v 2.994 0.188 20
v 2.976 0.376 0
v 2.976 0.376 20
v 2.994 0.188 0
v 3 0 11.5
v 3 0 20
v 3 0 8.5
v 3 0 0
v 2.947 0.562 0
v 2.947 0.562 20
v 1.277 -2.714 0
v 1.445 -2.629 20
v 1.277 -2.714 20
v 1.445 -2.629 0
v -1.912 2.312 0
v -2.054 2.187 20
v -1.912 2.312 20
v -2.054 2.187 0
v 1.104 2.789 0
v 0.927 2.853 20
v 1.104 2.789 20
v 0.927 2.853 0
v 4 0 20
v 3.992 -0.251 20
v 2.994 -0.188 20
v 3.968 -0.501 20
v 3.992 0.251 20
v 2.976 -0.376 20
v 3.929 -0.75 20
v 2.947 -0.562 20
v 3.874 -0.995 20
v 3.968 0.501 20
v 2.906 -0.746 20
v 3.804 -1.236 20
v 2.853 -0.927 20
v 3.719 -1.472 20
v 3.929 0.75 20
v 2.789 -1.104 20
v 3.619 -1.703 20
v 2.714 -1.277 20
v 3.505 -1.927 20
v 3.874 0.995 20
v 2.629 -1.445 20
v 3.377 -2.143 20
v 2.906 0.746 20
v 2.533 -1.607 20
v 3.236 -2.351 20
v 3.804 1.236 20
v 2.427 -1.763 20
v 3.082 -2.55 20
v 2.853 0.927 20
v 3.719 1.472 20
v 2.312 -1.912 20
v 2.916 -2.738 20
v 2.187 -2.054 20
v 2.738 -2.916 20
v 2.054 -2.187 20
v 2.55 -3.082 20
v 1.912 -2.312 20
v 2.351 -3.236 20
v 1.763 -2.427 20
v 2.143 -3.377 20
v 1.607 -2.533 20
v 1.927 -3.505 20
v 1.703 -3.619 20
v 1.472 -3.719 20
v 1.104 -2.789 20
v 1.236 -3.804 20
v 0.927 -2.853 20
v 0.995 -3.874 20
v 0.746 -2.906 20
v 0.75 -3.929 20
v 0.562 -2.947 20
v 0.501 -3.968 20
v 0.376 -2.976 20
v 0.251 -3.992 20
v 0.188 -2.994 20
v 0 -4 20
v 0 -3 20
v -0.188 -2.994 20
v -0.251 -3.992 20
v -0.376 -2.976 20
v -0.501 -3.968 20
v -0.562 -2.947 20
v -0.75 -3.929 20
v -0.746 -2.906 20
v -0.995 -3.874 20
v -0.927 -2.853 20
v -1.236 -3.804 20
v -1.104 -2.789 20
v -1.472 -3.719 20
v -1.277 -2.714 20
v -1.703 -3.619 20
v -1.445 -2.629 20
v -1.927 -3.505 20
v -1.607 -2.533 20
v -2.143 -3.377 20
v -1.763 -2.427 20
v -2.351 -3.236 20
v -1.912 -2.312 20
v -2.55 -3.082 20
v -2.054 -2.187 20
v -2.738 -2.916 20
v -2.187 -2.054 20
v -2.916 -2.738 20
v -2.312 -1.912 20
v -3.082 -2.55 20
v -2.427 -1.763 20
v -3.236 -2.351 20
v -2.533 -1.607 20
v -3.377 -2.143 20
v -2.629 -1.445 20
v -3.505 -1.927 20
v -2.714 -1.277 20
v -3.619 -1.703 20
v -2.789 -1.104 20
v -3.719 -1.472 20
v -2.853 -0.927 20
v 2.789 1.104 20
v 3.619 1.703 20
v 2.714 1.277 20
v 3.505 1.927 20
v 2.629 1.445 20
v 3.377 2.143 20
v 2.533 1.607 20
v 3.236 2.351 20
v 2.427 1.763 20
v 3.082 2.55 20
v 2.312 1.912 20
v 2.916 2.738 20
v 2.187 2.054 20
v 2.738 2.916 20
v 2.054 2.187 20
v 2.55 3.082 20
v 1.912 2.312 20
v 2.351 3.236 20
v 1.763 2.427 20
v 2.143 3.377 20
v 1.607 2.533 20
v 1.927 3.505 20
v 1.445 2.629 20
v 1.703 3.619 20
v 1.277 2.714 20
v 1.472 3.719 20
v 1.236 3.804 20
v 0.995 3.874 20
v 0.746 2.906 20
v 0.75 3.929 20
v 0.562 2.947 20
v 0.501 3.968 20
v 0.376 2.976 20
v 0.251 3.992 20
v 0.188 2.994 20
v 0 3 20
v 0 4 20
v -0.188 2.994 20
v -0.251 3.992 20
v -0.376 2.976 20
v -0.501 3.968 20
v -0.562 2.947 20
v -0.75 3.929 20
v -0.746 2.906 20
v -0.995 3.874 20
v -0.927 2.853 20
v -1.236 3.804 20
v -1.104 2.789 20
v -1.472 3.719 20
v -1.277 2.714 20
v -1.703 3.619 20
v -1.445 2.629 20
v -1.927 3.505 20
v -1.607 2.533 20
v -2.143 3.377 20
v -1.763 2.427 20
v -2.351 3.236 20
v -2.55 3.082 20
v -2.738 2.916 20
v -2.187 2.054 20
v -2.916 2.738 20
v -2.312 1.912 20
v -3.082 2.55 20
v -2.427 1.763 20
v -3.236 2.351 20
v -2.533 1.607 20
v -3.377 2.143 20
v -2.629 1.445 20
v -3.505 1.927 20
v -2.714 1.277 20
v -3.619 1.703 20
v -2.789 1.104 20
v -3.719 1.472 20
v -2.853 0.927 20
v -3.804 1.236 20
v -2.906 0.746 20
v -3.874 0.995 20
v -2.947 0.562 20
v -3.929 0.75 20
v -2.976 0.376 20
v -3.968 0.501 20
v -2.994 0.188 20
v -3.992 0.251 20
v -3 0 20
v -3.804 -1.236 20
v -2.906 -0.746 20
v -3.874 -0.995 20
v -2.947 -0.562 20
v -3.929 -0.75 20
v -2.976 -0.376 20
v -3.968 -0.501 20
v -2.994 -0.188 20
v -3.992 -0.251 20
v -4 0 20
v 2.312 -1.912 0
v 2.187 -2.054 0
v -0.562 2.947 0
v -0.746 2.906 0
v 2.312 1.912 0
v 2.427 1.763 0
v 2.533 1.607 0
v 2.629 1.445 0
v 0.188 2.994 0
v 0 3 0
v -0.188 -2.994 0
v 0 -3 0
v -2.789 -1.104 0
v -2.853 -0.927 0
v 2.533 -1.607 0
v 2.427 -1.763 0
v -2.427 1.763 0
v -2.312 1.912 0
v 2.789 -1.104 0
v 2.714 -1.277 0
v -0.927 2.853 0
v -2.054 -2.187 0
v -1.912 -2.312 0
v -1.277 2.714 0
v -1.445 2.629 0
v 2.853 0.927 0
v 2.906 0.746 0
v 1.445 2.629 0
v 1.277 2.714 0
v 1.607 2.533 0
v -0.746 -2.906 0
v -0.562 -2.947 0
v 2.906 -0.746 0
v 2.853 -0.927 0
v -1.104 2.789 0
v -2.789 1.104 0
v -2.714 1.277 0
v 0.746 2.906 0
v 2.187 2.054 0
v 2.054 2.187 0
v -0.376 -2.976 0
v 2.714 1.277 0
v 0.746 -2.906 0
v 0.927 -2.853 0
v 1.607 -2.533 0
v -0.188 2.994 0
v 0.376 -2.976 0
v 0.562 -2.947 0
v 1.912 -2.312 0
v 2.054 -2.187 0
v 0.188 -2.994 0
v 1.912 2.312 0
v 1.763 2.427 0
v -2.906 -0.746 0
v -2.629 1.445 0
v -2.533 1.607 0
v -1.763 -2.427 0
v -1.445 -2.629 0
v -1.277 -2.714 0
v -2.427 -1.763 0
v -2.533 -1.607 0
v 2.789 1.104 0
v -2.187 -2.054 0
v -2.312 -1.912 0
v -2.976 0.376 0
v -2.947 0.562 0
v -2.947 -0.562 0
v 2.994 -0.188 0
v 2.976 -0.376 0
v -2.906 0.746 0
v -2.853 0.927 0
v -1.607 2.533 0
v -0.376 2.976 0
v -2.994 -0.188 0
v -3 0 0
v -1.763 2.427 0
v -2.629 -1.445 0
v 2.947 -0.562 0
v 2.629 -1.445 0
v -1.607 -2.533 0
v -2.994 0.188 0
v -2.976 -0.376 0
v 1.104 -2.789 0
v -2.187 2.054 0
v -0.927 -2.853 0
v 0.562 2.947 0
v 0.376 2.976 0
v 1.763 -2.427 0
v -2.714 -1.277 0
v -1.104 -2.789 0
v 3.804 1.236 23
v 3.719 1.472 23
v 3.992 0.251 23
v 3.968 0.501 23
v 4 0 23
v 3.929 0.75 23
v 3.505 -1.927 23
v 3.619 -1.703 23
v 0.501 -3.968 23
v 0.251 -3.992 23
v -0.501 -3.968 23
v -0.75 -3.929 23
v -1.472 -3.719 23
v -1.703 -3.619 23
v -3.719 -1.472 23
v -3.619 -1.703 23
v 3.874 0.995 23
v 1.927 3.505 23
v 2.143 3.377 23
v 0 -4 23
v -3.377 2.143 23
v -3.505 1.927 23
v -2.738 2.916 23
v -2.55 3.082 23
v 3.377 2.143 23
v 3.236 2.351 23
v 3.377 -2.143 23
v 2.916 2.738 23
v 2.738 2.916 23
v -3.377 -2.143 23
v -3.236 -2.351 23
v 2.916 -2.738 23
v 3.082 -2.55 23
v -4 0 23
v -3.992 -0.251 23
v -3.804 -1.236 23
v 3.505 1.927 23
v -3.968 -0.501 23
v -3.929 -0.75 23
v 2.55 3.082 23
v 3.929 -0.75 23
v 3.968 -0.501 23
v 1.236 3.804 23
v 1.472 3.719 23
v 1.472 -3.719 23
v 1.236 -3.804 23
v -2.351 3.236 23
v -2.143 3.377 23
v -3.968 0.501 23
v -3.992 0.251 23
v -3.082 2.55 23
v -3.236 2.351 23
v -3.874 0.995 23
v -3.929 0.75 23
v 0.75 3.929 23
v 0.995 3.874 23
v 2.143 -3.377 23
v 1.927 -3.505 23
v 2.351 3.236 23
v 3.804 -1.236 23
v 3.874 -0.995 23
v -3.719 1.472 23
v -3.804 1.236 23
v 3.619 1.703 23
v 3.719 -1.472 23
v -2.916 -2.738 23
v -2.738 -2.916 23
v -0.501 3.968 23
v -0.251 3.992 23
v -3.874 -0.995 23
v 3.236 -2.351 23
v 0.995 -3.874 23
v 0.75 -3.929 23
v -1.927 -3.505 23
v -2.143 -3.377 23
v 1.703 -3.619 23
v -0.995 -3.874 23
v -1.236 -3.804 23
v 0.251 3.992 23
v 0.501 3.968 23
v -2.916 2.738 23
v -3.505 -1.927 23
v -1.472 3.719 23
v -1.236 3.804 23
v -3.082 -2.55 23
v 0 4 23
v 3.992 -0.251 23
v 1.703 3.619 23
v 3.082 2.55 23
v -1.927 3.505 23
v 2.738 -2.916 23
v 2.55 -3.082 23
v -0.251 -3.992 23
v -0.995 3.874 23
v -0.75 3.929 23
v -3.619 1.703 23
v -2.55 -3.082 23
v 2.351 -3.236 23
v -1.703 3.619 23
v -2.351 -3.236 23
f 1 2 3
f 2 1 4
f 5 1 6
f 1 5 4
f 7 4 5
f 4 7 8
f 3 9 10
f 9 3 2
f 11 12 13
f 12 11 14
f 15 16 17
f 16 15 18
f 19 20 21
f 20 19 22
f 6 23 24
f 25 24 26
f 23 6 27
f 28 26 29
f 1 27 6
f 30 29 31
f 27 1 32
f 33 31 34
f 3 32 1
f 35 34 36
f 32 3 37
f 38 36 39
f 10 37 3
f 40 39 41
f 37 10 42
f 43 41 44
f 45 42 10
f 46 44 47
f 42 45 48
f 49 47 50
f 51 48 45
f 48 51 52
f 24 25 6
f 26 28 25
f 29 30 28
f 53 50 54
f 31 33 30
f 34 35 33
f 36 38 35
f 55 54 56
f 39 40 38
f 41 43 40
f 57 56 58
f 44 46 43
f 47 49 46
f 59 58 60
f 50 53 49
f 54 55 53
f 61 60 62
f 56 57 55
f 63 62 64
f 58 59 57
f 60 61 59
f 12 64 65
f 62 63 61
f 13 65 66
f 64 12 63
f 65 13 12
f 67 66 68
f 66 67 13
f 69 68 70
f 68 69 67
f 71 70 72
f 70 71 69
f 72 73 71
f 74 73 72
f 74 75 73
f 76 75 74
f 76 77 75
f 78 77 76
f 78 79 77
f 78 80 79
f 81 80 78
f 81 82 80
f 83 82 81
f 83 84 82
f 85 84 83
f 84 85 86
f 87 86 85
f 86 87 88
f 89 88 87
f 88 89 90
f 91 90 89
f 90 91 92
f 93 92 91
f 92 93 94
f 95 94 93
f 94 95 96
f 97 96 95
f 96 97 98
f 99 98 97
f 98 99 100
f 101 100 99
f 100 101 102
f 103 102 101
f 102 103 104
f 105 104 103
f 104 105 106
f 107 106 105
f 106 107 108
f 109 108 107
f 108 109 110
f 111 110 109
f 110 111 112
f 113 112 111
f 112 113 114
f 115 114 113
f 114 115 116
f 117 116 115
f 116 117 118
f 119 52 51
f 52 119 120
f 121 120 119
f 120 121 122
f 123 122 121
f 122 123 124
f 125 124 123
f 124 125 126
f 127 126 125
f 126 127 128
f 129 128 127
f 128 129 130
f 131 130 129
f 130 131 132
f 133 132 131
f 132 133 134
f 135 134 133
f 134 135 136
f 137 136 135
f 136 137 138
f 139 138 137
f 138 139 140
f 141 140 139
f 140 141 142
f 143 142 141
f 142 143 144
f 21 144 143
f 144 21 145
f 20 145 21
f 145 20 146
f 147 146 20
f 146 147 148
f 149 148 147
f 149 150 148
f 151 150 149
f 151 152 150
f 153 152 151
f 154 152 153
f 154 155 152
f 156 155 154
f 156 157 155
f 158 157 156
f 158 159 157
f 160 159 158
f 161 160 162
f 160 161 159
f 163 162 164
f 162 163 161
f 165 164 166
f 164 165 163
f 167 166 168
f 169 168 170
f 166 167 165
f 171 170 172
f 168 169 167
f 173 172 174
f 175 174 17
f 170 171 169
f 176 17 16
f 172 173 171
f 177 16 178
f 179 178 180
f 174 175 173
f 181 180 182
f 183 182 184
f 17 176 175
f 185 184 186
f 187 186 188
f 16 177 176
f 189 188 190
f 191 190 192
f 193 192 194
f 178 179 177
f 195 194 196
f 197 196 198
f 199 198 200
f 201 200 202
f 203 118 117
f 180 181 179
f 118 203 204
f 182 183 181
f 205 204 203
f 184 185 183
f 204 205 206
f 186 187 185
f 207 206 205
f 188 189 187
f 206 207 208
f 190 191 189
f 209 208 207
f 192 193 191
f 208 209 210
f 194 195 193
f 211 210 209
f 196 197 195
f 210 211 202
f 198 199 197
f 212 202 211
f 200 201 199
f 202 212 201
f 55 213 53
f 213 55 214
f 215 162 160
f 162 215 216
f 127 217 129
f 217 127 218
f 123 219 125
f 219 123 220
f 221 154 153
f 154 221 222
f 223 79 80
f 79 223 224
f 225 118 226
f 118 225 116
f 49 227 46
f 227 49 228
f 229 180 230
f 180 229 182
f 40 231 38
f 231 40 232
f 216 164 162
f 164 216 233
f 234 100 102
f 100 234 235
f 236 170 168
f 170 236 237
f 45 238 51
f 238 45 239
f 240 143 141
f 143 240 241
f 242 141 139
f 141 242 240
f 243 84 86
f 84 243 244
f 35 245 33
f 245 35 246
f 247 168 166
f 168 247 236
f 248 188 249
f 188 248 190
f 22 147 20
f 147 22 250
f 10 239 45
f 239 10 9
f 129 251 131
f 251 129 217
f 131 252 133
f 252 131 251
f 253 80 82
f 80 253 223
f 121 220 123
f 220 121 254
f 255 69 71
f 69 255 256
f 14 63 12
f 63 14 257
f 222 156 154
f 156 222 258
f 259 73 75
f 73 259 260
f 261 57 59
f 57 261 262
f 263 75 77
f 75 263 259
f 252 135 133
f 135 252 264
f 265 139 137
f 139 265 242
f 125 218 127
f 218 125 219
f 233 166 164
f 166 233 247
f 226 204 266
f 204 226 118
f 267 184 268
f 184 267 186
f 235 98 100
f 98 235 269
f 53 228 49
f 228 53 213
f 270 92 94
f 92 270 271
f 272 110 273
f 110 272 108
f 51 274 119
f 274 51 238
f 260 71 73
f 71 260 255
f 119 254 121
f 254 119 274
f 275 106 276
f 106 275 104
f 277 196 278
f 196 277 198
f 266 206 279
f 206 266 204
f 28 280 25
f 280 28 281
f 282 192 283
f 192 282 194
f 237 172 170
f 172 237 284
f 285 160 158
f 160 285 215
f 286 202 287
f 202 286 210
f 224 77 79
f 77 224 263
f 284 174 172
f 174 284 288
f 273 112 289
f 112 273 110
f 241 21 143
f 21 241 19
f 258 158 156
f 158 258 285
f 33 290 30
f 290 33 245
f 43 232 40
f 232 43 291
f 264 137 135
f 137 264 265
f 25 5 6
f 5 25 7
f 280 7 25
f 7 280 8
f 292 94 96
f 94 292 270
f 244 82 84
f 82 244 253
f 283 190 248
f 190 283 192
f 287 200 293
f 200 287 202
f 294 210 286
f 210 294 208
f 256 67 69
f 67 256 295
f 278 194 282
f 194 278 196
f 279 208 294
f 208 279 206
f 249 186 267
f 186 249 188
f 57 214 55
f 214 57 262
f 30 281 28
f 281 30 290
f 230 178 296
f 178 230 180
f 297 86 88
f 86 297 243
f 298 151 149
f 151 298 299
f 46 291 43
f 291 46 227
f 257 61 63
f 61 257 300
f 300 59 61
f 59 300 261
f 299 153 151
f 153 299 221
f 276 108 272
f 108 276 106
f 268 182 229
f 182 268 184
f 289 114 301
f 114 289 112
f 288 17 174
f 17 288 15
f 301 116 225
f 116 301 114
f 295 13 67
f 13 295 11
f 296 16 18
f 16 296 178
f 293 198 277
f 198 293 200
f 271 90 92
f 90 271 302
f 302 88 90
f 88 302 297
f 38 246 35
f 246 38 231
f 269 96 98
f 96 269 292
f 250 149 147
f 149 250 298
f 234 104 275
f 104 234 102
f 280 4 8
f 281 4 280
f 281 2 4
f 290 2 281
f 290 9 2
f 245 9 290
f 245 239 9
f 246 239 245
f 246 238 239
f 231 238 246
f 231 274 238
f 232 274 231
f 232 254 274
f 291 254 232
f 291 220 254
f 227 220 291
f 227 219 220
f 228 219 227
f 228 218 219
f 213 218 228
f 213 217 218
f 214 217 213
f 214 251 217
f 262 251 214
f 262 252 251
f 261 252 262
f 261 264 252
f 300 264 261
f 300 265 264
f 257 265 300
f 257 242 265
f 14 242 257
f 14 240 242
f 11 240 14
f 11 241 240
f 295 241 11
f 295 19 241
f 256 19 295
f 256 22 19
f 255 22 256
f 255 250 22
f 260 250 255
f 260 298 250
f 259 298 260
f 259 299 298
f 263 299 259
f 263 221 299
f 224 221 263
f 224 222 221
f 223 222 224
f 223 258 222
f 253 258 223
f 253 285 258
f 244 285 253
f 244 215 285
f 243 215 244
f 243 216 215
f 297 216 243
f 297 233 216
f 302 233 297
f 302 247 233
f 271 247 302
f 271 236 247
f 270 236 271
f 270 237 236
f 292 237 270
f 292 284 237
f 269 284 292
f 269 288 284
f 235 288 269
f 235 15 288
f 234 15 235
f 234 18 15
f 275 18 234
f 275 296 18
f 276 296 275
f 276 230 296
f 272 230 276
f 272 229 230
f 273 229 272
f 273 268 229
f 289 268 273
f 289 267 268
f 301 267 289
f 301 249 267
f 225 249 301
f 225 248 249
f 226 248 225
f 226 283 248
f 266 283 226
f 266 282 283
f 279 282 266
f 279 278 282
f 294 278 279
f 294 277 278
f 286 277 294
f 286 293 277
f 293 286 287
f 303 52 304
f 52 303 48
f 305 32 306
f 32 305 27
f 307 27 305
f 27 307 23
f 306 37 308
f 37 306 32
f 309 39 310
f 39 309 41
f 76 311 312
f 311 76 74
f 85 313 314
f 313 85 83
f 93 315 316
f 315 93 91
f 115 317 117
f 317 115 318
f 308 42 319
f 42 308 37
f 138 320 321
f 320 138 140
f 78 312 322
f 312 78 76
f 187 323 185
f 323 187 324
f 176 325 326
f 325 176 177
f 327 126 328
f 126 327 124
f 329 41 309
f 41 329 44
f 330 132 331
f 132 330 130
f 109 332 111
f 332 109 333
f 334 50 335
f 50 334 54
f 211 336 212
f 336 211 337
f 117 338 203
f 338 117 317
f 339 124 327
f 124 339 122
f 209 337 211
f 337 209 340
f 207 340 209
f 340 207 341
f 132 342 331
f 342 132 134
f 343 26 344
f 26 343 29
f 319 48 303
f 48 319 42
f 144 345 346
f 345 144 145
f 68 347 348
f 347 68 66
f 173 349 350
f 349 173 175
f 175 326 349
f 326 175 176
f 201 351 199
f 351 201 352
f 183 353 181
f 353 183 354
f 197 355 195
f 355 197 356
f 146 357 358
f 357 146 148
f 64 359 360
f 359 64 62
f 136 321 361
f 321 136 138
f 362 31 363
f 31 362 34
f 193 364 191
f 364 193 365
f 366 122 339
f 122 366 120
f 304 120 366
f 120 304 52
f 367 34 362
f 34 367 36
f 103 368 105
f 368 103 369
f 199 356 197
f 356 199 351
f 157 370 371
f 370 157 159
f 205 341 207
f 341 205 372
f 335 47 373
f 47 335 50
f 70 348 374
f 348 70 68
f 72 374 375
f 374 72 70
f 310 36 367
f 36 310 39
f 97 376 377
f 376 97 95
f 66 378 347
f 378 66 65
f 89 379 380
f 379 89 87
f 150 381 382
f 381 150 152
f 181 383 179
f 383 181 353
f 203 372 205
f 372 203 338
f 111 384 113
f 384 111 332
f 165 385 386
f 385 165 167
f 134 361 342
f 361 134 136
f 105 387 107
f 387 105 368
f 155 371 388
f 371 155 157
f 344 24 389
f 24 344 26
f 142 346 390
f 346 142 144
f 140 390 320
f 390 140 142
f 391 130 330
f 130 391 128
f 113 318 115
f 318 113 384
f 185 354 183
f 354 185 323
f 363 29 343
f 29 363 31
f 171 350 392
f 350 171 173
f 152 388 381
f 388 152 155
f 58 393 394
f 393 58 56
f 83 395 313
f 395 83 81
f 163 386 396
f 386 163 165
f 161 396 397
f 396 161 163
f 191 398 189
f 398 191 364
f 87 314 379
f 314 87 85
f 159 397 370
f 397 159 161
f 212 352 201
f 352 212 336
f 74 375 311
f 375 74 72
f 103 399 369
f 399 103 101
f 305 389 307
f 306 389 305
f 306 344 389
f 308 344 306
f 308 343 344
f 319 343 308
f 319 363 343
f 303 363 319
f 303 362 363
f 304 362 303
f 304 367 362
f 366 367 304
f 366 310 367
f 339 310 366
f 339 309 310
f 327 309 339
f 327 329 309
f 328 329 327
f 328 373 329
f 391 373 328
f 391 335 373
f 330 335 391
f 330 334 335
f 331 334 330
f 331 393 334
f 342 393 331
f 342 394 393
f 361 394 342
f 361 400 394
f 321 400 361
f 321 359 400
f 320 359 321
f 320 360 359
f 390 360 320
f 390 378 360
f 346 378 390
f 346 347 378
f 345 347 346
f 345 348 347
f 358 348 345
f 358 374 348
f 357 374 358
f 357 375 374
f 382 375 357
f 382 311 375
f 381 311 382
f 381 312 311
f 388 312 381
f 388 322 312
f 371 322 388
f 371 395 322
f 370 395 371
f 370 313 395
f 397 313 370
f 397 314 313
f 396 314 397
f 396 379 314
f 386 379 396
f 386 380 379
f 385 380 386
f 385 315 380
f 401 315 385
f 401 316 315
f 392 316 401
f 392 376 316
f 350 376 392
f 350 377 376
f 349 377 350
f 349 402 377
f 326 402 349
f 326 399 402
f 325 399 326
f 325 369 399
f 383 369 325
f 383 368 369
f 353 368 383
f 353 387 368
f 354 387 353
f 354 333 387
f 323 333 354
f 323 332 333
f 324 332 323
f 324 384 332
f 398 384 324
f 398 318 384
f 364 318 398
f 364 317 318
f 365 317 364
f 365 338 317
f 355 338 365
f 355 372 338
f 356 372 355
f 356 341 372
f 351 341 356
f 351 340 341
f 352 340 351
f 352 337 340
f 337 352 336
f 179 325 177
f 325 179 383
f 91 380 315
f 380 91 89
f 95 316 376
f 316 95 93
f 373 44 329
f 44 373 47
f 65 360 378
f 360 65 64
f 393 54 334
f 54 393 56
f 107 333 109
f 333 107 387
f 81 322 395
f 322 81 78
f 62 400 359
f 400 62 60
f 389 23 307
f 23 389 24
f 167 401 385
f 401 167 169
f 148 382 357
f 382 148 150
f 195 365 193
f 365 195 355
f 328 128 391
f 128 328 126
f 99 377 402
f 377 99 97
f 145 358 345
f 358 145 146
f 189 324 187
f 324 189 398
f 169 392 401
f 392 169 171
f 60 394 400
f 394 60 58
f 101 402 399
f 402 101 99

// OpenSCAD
// Parámetros del adaptador
largo_adaptador = 20;         // Largo total del adaptador
diametro_base = 6;            // Diámetro que encaja en la varilla
diametro_top = 8;             // Diámetro donde se apoya la cuchilla
altura_top = 3;               // Grosor del tope superior (para la cuchilla)
tornillo_diametro = 3;        // Diámetro del agujero lateral (M3)

// Adaptador
difference() {
    // Parte inferior cilíndrica (inserta en la varilla)
    union() {
        cylinder(h = largo_adaptador, d = diametro_base, $fn=100);
        translate([0,0,largo_adaptador])
            cylinder(h = altura_top, d = diametro_top, $fn=100);
    }

    // Agujero lateral para tornillo
    rotate([0,90,0])
        translate([-largo_adaptador/2, 0, diametro_base/2])
            cylinder(h = diametro_top+2, d = tornillo_diametro, $fn=50);
}
